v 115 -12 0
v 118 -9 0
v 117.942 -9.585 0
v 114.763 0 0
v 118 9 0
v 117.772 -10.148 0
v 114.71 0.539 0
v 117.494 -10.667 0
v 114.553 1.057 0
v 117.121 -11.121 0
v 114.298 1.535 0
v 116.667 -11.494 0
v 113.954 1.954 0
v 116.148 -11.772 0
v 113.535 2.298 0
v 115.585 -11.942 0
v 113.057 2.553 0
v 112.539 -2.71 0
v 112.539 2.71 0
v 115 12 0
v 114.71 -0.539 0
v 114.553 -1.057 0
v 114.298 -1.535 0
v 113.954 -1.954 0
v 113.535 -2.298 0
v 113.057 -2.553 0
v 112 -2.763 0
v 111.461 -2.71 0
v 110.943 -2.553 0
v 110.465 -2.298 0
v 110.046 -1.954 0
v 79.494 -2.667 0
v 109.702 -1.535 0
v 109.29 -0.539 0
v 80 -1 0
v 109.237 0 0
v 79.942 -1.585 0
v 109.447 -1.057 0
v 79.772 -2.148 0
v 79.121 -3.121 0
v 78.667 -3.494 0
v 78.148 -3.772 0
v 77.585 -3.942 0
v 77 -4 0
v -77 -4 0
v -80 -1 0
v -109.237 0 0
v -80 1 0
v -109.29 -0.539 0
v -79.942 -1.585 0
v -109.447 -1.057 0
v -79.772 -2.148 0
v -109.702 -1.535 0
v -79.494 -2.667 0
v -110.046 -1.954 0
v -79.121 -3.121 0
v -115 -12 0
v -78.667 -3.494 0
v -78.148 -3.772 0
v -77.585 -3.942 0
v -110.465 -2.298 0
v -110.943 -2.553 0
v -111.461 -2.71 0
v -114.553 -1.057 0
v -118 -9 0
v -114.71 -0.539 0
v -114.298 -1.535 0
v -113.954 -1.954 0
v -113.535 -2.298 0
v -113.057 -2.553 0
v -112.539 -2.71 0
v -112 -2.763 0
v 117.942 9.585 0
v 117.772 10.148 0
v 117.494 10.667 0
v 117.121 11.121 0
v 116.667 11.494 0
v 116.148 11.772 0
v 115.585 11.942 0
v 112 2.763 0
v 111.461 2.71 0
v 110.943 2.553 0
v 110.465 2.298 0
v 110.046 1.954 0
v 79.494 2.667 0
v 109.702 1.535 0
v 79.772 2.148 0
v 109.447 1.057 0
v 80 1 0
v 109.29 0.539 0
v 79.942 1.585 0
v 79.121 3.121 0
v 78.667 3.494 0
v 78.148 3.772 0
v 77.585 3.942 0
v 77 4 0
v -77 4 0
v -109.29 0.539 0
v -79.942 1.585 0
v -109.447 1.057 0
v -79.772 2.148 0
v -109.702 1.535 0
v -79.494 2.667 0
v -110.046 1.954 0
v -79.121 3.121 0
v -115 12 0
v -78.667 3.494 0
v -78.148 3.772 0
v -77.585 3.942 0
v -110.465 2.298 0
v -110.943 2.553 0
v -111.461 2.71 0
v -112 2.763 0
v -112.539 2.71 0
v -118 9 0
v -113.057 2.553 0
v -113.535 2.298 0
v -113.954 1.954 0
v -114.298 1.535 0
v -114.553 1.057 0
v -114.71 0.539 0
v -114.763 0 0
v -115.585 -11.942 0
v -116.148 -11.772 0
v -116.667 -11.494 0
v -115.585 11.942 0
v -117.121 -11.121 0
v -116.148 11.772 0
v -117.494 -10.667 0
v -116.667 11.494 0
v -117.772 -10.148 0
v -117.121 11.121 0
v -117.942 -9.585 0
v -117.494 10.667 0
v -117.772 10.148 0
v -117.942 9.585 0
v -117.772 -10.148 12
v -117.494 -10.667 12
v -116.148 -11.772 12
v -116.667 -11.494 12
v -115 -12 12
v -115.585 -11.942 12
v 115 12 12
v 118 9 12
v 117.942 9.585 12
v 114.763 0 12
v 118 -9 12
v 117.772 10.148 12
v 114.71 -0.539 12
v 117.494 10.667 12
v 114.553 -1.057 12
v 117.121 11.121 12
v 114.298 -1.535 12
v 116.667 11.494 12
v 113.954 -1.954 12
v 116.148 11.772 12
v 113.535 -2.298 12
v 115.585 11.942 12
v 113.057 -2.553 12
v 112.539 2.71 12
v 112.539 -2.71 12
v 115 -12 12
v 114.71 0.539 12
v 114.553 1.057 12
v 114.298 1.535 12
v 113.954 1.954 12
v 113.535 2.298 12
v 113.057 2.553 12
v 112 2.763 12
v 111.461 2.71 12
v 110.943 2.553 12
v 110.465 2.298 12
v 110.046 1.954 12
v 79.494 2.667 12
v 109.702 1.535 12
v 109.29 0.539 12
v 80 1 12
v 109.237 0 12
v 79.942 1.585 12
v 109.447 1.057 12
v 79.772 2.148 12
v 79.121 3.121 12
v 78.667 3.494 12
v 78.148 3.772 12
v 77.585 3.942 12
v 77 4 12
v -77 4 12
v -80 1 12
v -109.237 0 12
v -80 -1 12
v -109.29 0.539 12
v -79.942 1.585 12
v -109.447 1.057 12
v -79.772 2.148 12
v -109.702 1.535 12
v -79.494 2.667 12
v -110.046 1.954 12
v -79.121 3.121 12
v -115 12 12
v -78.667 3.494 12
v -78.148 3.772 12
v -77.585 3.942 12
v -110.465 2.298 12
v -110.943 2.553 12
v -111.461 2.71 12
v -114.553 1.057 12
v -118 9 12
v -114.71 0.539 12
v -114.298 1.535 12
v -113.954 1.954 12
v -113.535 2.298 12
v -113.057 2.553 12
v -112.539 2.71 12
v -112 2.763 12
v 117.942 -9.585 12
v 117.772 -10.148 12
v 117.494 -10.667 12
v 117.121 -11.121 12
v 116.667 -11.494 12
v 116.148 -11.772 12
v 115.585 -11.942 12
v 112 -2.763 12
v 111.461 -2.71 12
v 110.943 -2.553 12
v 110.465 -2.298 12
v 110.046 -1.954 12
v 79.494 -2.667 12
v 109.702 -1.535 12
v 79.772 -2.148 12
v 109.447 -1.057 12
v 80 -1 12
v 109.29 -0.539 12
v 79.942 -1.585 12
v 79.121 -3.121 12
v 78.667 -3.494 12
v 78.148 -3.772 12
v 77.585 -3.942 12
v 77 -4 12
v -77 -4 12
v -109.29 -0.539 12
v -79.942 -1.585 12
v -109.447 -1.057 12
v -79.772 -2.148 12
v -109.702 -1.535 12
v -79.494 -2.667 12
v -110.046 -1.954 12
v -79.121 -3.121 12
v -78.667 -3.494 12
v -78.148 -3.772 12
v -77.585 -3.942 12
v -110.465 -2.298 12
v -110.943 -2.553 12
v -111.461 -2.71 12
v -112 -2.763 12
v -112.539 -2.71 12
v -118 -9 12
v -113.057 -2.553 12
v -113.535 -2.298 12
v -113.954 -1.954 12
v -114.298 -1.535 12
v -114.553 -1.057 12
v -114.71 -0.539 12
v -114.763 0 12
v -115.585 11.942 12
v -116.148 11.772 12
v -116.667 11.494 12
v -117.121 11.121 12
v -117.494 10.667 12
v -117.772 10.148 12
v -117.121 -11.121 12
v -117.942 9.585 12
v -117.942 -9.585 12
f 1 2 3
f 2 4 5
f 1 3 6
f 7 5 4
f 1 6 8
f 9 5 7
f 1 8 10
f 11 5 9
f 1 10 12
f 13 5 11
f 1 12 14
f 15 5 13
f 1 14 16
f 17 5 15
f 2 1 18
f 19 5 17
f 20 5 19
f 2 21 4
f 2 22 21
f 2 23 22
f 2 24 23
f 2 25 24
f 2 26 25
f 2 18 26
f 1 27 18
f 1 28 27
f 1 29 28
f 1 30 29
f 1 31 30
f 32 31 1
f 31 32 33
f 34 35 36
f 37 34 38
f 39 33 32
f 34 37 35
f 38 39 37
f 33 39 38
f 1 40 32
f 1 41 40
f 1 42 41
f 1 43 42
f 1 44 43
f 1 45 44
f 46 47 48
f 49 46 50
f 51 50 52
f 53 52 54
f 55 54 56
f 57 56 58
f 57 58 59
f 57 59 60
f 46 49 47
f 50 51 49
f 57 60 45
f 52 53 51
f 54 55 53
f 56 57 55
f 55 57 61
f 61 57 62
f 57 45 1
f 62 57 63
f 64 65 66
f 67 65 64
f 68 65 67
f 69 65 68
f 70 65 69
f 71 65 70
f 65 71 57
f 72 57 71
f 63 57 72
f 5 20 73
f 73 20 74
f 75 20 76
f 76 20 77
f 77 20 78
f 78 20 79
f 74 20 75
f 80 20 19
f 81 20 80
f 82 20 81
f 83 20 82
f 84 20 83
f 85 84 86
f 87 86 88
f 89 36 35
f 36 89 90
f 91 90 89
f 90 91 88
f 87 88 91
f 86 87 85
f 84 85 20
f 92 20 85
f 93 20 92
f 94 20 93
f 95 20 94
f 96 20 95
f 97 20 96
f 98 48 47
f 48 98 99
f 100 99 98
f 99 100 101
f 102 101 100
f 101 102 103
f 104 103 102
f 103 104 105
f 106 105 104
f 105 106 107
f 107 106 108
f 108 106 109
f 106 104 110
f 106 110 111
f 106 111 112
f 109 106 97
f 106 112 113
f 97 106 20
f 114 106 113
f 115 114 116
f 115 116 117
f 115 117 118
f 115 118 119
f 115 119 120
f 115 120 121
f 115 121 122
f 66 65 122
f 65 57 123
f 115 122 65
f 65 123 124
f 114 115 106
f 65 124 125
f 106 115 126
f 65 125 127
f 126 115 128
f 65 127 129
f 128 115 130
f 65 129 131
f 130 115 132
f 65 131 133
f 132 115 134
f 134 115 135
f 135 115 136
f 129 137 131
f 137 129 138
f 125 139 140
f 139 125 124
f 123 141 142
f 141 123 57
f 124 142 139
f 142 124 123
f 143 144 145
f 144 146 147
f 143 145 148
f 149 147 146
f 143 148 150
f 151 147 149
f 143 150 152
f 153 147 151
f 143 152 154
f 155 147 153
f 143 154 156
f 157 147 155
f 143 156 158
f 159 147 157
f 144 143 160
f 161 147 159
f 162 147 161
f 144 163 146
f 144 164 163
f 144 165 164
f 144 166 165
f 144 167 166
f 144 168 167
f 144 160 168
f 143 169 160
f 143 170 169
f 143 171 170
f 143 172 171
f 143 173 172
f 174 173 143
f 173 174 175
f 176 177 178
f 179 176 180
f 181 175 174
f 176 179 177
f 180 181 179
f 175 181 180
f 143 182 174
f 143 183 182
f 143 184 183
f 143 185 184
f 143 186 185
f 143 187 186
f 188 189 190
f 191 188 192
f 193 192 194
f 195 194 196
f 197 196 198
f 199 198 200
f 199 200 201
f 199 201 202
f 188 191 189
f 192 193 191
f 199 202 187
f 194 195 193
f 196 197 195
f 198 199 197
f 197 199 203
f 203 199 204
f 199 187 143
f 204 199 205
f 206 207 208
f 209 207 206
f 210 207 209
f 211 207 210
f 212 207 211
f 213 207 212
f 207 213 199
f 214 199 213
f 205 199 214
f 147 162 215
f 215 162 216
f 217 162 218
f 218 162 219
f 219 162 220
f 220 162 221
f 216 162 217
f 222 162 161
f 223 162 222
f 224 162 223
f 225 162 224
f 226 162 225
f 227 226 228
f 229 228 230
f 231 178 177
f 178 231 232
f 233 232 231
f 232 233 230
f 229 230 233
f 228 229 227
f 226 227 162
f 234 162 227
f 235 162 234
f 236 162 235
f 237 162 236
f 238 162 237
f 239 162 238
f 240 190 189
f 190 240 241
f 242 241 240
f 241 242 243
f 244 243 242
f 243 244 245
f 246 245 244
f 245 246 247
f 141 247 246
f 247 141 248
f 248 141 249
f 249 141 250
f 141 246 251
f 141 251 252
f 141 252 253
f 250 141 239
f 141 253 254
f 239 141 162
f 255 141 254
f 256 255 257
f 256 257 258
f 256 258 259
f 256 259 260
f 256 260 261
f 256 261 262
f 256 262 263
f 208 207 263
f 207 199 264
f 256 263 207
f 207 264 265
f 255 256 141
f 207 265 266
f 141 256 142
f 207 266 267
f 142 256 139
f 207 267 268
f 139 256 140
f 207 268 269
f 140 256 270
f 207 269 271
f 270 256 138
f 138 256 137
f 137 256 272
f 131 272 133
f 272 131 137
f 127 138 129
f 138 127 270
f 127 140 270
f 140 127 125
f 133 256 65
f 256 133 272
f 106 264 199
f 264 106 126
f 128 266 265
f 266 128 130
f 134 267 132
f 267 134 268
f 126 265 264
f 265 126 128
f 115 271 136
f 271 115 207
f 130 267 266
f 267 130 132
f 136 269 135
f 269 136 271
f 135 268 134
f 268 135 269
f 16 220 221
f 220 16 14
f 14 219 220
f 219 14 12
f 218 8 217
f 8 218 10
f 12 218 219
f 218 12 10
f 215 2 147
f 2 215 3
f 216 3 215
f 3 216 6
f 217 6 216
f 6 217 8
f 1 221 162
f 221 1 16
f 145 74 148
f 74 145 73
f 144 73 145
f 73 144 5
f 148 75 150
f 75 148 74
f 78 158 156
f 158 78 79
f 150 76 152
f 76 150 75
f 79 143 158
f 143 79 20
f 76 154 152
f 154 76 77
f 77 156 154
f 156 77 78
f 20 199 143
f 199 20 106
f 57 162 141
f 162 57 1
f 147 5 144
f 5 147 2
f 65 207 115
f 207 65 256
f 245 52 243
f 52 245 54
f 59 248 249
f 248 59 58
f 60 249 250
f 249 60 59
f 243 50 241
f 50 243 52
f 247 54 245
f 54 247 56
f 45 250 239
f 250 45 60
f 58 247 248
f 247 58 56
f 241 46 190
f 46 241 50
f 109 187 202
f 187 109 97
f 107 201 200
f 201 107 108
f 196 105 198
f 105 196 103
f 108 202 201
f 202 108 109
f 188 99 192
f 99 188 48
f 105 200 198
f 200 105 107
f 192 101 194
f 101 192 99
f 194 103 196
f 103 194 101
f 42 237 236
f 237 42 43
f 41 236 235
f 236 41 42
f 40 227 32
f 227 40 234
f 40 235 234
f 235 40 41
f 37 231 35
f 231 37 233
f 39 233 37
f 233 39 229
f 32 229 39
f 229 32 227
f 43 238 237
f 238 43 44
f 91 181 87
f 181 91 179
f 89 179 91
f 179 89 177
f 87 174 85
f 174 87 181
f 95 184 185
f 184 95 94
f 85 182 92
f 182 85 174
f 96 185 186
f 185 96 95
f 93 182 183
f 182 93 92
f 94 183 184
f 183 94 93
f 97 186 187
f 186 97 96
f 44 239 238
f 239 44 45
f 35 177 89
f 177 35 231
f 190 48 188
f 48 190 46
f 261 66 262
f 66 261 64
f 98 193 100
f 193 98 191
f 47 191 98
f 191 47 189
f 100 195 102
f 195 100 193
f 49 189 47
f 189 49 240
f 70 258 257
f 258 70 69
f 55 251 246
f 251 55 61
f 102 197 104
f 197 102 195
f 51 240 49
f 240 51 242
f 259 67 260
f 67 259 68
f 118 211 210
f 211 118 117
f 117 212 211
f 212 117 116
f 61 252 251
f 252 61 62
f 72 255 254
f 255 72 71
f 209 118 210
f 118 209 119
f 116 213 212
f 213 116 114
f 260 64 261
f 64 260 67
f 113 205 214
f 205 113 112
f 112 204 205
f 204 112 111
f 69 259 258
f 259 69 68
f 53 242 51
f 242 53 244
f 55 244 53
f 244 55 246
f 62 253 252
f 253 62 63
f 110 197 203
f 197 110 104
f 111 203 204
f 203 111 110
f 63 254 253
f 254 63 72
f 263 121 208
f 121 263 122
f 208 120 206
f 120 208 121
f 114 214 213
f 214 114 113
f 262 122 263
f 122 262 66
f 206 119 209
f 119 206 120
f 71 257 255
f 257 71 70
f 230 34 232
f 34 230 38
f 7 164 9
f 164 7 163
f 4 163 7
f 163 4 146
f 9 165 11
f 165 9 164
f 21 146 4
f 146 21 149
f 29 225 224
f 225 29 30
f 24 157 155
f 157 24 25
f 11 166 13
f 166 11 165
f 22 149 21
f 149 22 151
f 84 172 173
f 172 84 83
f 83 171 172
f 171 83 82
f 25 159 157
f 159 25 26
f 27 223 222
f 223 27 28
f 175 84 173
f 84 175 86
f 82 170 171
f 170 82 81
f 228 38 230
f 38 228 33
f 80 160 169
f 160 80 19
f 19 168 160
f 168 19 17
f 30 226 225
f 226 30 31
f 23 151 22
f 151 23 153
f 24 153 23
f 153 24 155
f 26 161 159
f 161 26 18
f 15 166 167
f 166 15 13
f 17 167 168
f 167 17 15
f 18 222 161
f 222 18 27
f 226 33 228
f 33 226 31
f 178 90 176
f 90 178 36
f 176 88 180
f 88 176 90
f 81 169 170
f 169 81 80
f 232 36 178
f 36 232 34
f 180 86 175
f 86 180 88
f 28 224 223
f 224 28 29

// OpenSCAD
// Two identical upper clamp bars. Flat underside Z=0. mm.
/* [Dimensions] */
width=236;
depth=24;
thickness=12;
rod_pitch=224;
rod_hole=5.5;
$fn=48;
assert((width-rod_pitch-rod_hole)/2>=3);
assert(depth>=20 && thickness>=10);
module hole(d,h){cylinder(d=d/cos(180/32),h=h,$fn=32);}
difference(){
 translate([-width/2,-depth/2,0])rb([width,depth,thickness],3);
 // Solid ends and twin 8 mm side ribs remain.
 translate([-80,-4,-.02])rb([160,8,thickness+.04],3);
 for(x=[-rod_pitch/2,rod_pitch/2])translate([x,0,-0.02])hole(rod_hole,thickness+0.04);
}

// Rounded profile extrusions preserve planar mating faces and bed contact.
module rz(s,r){
 assert(r>0 && 2*r<min(s[0],s[1]));
 union(){
  translate([r,0,0])cube([s[0]-2*r,s[1],s[2]]);
  translate([0,r,0])cube([s[0],s[1]-2*r,s[2]]);
  for(x=[r,s[0]-r],y=[r,s[1]-r])translate([x,y,0])cylinder(r=r,h=s[2],$fn=32);
 }
}
module rb(s,r=2,axis="z"){
 if(axis=="z")rz(s,r);
 if(axis=="y")translate([0,s[1],0])rotate([90,0,0])rz([s[0],s[2],s[1]],r);
 if(axis=="x")translate([0,0,s[2]])rotate([0,90,0])rz([s[2],s[1],s[0]],r);
}
// +X peak; rotate in bore plane so peak points upward in the supplied print STL.
module roof(d,h,angle=0){
 r=d/2/cos(180/32);
 rotate([0,0,angle])linear_extrude(height=h)union(){
  circle(r=r,$fn=32);
  polygon([[r/sqrt(2),-r/sqrt(2)],[sqrt(2)*r,0],[r/sqrt(2),r/sqrt(2)]]);
 }
}
